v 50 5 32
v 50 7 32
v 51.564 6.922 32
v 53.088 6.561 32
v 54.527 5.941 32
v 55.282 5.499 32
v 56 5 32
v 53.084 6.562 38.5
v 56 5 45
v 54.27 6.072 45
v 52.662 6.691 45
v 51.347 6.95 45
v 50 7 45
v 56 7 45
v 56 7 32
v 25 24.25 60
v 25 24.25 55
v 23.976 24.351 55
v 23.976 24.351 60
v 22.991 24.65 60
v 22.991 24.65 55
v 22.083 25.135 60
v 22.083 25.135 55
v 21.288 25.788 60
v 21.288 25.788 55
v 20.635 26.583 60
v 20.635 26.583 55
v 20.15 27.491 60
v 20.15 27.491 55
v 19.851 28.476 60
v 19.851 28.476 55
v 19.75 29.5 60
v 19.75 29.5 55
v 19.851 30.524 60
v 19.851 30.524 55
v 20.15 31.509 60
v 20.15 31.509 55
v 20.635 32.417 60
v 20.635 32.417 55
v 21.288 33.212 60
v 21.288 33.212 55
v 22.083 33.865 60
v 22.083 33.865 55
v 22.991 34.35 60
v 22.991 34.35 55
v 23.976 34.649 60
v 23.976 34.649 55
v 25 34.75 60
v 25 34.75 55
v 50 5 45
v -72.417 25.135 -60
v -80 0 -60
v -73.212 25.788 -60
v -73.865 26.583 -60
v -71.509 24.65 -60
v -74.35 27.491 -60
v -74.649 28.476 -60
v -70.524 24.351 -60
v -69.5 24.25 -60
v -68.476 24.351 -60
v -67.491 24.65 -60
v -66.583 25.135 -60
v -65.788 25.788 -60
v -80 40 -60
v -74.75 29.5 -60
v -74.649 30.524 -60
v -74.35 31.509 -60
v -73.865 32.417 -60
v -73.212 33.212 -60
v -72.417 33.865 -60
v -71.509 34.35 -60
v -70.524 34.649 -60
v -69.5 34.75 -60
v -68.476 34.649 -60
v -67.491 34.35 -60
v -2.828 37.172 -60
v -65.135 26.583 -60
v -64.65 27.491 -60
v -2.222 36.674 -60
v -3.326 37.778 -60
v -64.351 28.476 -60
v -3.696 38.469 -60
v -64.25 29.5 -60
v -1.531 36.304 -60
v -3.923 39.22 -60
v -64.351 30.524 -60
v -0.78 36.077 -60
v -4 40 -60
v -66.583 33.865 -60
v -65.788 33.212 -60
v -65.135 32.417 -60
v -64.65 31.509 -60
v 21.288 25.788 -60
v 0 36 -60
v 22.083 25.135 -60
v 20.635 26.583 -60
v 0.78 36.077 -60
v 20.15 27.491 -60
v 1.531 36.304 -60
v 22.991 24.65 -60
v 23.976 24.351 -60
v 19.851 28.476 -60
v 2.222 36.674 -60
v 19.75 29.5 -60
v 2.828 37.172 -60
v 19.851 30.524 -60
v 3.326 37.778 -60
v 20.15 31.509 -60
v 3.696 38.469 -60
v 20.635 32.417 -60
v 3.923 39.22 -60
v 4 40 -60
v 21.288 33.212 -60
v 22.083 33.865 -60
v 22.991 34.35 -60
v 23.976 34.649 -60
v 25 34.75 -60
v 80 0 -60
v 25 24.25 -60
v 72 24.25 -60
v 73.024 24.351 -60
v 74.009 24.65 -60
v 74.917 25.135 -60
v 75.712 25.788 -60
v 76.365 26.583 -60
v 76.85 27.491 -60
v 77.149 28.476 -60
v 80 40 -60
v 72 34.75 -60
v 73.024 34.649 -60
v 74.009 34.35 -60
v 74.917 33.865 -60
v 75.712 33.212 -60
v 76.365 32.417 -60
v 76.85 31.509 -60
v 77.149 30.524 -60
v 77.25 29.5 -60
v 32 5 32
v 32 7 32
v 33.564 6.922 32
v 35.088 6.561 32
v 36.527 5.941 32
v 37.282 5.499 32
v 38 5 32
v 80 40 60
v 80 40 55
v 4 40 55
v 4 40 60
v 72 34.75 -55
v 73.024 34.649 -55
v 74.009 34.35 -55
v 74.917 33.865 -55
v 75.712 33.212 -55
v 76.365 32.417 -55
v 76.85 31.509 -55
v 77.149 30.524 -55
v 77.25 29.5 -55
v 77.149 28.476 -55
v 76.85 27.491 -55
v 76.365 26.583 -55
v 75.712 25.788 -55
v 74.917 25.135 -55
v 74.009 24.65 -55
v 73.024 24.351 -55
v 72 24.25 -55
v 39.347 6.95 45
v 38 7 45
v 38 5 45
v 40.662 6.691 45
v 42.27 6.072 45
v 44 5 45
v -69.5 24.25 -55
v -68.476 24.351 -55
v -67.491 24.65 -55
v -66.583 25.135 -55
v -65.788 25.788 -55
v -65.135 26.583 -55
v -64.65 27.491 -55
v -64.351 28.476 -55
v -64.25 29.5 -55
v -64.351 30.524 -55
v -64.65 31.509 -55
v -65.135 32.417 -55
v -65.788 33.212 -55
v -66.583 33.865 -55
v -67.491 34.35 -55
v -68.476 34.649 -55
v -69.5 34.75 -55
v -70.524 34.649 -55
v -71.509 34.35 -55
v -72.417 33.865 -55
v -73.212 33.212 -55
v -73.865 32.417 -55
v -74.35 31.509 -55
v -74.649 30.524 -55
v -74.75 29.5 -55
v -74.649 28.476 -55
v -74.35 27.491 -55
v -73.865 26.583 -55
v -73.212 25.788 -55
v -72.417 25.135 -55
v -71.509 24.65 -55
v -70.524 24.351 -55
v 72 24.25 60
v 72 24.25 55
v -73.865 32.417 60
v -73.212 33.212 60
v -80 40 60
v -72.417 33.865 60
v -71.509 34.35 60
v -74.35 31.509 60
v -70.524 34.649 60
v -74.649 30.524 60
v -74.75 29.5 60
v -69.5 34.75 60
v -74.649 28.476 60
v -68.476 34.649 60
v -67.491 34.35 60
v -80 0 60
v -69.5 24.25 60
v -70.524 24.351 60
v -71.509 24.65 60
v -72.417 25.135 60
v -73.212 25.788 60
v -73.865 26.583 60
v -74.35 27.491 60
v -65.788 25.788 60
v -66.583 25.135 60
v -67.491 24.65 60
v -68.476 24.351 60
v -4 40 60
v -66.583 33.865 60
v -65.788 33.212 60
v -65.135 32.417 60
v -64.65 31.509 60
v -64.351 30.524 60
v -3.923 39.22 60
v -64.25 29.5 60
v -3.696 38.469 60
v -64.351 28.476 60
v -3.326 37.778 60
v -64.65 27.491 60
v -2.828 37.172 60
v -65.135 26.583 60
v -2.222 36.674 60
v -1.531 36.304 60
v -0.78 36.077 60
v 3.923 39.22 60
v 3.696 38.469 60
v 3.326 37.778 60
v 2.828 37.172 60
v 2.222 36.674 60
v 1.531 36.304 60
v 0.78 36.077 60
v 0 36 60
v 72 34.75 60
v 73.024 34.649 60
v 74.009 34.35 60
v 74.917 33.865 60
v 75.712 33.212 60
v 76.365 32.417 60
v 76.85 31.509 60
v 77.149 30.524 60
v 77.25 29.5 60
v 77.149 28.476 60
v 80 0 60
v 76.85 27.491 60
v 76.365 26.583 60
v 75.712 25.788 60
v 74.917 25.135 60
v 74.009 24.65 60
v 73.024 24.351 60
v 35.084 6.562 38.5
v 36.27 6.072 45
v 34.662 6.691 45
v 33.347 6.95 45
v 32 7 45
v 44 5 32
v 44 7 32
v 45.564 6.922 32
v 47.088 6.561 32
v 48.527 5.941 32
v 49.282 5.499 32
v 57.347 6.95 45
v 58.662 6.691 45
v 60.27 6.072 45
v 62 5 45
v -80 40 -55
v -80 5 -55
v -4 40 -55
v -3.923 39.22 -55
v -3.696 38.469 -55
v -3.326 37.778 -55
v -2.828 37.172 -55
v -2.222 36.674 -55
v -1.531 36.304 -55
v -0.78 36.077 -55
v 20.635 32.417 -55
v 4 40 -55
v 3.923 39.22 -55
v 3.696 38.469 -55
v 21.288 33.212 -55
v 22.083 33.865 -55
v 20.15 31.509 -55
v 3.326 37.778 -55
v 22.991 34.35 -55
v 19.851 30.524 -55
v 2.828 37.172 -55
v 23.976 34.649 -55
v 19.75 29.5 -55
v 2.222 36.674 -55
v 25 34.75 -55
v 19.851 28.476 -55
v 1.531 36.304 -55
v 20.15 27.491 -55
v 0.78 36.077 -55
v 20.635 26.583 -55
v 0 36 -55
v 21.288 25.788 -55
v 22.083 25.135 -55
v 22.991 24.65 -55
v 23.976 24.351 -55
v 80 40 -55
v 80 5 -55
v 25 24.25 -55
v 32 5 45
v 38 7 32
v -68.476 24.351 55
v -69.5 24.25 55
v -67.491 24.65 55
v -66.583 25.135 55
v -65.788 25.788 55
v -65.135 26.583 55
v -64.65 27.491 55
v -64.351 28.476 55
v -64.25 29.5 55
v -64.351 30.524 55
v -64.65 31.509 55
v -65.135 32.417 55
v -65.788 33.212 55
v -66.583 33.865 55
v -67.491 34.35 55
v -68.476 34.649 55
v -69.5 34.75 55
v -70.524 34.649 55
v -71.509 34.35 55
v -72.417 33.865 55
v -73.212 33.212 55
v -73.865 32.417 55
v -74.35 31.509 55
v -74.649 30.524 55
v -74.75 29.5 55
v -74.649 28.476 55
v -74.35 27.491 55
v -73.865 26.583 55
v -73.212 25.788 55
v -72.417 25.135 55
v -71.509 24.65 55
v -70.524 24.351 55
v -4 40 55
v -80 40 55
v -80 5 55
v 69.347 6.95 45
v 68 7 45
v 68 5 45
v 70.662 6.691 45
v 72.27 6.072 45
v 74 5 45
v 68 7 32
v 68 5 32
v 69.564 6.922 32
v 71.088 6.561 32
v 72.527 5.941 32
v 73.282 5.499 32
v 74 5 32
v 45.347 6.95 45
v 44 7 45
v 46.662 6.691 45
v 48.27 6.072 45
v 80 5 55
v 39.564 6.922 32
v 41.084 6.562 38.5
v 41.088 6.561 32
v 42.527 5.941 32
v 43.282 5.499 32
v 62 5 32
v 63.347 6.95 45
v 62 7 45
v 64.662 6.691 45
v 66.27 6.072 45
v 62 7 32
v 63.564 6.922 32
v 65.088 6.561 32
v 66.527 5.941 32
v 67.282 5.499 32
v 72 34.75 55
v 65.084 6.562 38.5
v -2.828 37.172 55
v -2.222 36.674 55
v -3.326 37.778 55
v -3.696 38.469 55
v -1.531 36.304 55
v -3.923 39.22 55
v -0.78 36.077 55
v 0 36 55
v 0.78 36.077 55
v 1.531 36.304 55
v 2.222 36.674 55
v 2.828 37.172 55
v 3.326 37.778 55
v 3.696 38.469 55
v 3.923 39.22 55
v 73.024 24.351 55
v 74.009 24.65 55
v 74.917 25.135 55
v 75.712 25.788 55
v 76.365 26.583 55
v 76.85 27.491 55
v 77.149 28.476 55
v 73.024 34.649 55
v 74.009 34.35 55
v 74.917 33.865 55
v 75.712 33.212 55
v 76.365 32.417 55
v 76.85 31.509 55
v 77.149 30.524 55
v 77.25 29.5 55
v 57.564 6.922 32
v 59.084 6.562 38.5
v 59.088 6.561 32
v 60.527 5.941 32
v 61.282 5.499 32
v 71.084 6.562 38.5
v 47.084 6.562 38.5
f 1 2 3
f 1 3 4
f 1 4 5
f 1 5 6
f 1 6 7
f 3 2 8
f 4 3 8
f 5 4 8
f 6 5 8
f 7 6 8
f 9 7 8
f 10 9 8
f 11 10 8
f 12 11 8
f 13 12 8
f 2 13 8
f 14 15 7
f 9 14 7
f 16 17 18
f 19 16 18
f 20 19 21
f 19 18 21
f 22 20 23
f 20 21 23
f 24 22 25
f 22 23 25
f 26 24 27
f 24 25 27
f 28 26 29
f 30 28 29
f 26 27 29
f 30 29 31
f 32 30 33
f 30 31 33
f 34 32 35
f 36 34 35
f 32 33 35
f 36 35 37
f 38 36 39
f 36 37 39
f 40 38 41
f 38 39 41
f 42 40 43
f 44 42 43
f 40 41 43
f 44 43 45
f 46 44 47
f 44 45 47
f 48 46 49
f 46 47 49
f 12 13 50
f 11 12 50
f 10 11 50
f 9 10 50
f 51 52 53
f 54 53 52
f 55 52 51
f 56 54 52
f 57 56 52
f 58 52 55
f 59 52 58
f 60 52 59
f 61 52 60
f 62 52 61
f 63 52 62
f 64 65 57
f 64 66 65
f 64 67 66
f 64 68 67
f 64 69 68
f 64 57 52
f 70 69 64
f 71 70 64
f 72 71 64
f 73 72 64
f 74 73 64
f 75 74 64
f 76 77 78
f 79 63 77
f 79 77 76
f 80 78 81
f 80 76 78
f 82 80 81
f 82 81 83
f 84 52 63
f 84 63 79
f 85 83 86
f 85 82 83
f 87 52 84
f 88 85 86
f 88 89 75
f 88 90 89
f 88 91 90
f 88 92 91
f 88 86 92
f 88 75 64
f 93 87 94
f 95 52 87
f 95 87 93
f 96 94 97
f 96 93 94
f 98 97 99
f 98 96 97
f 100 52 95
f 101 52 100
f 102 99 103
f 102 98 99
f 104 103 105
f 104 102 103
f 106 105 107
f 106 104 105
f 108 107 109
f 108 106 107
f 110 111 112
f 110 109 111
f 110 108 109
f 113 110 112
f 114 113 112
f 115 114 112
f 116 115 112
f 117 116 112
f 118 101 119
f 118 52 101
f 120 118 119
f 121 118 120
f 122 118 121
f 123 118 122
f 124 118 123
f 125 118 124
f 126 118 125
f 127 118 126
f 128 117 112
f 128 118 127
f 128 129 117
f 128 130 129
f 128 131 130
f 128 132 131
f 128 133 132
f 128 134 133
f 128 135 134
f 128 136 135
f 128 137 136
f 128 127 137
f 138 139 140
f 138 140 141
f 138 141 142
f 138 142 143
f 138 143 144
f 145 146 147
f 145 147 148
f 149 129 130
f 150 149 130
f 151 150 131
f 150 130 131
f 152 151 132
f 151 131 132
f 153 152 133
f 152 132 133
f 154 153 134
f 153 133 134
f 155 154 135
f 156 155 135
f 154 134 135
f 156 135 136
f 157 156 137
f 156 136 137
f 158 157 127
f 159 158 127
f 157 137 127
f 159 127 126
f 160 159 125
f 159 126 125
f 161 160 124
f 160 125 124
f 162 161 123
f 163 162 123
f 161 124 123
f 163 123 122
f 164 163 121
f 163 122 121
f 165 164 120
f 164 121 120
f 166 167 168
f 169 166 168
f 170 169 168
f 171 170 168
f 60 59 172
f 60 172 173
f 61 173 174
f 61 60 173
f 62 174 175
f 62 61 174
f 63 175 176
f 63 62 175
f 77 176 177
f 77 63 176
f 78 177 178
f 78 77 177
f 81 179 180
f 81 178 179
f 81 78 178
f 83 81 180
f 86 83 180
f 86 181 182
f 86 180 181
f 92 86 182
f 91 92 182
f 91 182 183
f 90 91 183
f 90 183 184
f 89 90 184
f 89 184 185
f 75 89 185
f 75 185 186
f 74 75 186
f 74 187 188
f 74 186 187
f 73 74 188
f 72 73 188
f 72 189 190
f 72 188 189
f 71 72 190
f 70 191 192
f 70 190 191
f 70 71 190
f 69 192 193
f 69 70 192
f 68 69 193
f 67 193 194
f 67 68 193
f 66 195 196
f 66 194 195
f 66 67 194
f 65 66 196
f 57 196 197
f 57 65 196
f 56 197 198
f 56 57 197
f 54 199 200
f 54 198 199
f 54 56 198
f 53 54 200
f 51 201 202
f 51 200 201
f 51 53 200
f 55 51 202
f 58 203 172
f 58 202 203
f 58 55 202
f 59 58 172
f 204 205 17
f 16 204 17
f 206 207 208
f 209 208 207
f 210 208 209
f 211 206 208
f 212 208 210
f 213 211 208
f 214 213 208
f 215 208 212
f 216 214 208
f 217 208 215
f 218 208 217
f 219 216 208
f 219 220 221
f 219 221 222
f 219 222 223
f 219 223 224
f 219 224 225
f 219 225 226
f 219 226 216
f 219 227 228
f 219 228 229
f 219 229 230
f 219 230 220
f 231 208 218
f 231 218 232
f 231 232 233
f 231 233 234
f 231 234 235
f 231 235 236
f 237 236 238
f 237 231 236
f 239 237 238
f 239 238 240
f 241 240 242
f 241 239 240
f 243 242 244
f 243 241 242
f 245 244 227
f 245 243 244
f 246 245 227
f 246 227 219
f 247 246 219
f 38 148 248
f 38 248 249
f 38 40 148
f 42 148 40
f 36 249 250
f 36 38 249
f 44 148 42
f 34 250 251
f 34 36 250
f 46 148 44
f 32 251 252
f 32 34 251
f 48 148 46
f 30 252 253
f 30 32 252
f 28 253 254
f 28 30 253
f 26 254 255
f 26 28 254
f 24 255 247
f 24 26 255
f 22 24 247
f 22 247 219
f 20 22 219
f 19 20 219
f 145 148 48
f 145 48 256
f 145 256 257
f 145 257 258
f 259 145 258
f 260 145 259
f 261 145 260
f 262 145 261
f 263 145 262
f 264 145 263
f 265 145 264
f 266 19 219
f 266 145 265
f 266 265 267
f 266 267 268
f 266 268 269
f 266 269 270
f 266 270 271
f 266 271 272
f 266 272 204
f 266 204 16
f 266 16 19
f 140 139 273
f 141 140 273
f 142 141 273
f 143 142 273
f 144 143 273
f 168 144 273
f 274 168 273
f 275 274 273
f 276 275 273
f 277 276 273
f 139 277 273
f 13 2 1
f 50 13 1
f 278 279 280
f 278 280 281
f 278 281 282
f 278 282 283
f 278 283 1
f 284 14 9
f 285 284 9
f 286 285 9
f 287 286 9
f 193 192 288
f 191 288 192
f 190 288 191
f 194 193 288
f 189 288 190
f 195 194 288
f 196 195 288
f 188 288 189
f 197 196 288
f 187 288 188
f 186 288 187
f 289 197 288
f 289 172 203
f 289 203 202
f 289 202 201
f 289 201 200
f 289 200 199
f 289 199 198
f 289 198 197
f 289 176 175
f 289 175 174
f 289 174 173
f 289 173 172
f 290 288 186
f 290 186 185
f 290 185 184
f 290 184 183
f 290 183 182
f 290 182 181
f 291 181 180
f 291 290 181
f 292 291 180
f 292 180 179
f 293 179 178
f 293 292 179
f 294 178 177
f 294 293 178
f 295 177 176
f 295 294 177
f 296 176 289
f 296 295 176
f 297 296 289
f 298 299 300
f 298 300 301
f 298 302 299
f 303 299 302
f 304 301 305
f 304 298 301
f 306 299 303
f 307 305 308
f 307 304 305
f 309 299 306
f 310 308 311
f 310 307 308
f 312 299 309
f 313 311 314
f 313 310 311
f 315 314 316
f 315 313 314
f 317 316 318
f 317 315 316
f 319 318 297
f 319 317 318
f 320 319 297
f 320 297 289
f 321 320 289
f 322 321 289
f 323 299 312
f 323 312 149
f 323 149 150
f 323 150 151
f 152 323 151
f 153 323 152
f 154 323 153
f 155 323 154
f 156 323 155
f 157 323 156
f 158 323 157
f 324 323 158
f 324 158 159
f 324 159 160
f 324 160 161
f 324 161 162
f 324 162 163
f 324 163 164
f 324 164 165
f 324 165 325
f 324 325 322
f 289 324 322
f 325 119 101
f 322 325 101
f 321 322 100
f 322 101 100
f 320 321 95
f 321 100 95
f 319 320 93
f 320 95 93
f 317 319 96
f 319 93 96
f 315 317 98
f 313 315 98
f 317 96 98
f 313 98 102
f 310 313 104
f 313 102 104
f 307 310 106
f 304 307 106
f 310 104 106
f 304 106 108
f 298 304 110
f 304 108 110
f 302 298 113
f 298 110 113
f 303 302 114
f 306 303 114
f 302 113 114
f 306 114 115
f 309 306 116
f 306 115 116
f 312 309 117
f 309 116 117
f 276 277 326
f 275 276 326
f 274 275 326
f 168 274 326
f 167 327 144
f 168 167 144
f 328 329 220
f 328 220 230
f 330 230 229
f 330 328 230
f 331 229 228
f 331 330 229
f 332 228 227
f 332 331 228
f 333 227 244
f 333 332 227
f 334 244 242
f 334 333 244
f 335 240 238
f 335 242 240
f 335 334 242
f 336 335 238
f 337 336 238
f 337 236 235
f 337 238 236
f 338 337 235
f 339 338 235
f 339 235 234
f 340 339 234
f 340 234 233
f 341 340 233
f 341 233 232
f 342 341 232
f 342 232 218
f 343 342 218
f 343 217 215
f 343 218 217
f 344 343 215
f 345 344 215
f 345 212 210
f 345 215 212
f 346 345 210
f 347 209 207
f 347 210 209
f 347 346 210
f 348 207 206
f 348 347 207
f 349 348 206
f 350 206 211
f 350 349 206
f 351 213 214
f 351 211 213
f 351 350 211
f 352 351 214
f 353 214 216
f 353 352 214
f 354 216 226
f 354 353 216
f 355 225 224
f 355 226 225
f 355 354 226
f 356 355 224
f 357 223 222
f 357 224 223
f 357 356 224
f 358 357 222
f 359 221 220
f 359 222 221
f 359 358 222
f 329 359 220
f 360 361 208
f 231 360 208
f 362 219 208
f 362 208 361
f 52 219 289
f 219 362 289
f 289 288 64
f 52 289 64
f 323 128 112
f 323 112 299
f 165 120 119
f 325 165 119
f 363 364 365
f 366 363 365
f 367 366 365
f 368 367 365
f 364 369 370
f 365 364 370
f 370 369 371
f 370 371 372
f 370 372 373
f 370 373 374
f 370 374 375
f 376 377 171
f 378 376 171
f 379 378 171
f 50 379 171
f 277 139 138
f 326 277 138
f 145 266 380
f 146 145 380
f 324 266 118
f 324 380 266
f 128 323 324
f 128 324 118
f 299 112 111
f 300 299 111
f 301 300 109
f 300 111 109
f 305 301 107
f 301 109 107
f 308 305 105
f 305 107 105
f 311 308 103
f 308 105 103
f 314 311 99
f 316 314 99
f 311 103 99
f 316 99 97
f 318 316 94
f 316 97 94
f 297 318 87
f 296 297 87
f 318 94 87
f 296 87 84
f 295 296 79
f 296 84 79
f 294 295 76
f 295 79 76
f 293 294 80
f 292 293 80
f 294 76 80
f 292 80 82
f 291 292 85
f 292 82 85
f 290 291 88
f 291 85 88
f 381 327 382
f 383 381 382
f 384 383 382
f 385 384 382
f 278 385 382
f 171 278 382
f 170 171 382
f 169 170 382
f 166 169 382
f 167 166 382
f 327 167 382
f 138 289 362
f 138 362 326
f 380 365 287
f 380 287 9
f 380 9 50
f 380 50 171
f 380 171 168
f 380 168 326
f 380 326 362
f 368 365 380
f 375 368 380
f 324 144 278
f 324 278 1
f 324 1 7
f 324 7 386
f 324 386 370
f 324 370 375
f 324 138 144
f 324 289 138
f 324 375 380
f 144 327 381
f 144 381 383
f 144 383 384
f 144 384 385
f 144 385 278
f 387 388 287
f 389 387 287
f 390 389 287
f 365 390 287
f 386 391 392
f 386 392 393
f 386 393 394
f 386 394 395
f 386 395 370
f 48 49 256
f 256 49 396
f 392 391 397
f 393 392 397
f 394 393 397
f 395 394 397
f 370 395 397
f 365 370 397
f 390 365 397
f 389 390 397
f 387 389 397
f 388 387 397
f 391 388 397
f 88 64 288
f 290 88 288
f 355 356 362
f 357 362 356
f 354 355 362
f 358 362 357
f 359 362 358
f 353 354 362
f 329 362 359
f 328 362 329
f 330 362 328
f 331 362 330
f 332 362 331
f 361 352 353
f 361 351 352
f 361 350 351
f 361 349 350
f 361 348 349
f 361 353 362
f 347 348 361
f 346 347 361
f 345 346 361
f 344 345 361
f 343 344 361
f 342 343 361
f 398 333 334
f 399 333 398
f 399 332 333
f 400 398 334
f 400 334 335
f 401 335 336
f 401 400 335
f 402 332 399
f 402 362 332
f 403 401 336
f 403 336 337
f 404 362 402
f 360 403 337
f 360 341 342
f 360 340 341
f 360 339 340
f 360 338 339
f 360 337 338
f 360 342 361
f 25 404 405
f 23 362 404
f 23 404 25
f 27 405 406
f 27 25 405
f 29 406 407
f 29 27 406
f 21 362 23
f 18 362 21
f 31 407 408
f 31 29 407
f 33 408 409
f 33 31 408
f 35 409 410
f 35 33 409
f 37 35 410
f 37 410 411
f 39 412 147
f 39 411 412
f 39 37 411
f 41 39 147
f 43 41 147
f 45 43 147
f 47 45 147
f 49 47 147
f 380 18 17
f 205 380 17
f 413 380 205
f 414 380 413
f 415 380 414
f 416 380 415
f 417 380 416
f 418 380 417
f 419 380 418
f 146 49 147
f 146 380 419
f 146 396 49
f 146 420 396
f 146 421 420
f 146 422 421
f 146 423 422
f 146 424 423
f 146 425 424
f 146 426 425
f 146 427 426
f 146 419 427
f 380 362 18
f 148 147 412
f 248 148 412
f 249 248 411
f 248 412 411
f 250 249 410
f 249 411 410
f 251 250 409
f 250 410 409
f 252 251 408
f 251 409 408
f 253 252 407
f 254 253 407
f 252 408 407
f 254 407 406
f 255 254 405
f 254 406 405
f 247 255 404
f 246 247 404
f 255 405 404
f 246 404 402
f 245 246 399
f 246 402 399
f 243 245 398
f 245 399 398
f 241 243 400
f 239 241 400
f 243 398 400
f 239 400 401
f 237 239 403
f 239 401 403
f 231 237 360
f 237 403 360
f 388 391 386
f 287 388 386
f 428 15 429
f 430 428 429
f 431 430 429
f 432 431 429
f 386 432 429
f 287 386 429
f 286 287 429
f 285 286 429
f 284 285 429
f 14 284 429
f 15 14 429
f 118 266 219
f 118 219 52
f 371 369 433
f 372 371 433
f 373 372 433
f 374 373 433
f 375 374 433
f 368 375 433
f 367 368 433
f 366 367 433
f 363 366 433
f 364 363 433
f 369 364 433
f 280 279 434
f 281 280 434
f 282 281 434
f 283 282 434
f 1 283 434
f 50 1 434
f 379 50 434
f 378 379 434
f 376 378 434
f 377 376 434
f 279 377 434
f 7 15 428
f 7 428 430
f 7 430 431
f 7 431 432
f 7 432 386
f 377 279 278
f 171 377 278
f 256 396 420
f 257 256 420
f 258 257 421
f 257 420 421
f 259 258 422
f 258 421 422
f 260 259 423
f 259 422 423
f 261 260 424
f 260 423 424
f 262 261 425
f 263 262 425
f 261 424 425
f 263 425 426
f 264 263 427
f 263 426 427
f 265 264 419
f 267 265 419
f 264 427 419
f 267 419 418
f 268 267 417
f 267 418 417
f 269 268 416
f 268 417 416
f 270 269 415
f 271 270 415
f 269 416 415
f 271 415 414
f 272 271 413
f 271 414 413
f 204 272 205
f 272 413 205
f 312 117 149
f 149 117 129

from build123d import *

# Parameters (mm, degrees)
AUFSATZ_LINEAR_AUSTRAGEN3_DEPTH      = 80
SCHNITT_LINEAR_AUSTRAGEN1_DEPTH      = 150.666295471
SCHNITT_LINEAR_AUSTRAGEN1_DEPTH_BACK = 150.666295471
SKIZZE10_R                           = 5.25
SCHNITT_LINEAR_AUSTRAGEN2_DEPTH      = 108.703296143
SCHNITT_LINEAR_AUSTRAGEN2_DEPTH_BACK = 108.703296143
AUFSATZ_LINEAR_AUSTRAGEN4_DEPTH      = 45
LINEARES_MUSTER1_COUNT               = 7
LINEARES_MUSTER1_PITCH               = 6
SKIZZE19_W                           = 160
SKIZZE19_H                           = 35
SCHNITT_LINEAR_AUSTRAGEN3_DEPTH      = 32


with BuildPart() as part:
    # Skizze9 → Aufsatz-Linear austragen3 (new, symmetric)
    with BuildSketch(Plane(origin=(0, 0, 0), x_dir=(0, 0, -1), z_dir=(1, 0, 0))):
        Polygon((-60, 40), (-60, 0), (60, 0), (60, 40), (55, 40), (55, 5), (-55, 5), (-55, 40), align=None)
    extrude(amount=AUFSATZ_LINEAR_AUSTRAGEN3_DEPTH, both=True)

    # Skizze10 → Schnitt-Linear austragen1 (cut, two sides: drawn at the far end of the back side and taken through both)
    with BuildSketch(Plane.XY.offset(60).offset(-SCHNITT_LINEAR_AUSTRAGEN1_DEPTH_BACK)):
        with Locations(Location((-69.5, 29.5, 0), (0, 0, 270))):
            Circle(SKIZZE10_R)
        with BuildLine():
            Line((25, 34.75), (72, 34.75))
            ThreePointArc((72, 34.75), (77.25, 29.5), (72, 24.25))
            Line((72, 24.25), (25, 24.25))
            ThreePointArc((25, 24.25), (19.75, 29.5), (25, 34.75))
        make_face()
    extrude(amount=SCHNITT_LINEAR_AUSTRAGEN1_DEPTH + SCHNITT_LINEAR_AUSTRAGEN1_DEPTH_BACK, mode=Mode.SUBTRACT)

    # Skizze12 → Schnitt-Linear austragen2 (cut, two sides: drawn at the far end of the back side and taken through both)
    with BuildSketch(Plane.XY.offset(-SCHNITT_LINEAR_AUSTRAGEN2_DEPTH_BACK)):
        with BuildLine():
            Line((-4, 40), (4, 40))
            ThreePointArc((4, 40), (0, 36), (-4, 40))
        make_face()
    extrude(amount=SCHNITT_LINEAR_AUSTRAGEN2_DEPTH + SCHNITT_LINEAR_AUSTRAGEN2_DEPTH_BACK, mode=Mode.SUBTRACT)

    # Skizze18 → Aufsatz-Linear austragen4 (add)
    with BuildSketch(Plane(origin=(0, 0, 0), x_dir=(-1, 0, 0), z_dir=(0, 0, -1))):
        with BuildLine():
            Line((-32, 5), (-38, 5))
            add(Edge.make_bspline(
                [(-38, 5), (-35.16767955, 7.124664511), (-32, 7)],
                knots=[0, 0, 0, 0.477297659, 0.477297659, 0.477297659], degree=2))
            Line((-32, 7), (-32, 5))
        make_face()
    aufsatz_linear_austragen4 = extrude(amount=-AUFSATZ_LINEAR_AUSTRAGEN4_DEPTH)

    # Lineares Muster1: Aufsatz-Linear austragen4 ×7
    with Locations(*[(i * LINEARES_MUSTER1_PITCH, 0, 0) for i in range(1, LINEARES_MUSTER1_COUNT)]):
        add(aufsatz_linear_austragen4)

    # Skizze19 → Schnitt-Linear austragen3 (cut)
    with BuildSketch(Plane.XY):
        with Locations((0, 22.5)):
            Rectangle(SKIZZE19_W, SKIZZE19_H)
    extrude(amount=SCHNITT_LINEAR_AUSTRAGEN3_DEPTH, mode=Mode.SUBTRACT)


solid = part.part
